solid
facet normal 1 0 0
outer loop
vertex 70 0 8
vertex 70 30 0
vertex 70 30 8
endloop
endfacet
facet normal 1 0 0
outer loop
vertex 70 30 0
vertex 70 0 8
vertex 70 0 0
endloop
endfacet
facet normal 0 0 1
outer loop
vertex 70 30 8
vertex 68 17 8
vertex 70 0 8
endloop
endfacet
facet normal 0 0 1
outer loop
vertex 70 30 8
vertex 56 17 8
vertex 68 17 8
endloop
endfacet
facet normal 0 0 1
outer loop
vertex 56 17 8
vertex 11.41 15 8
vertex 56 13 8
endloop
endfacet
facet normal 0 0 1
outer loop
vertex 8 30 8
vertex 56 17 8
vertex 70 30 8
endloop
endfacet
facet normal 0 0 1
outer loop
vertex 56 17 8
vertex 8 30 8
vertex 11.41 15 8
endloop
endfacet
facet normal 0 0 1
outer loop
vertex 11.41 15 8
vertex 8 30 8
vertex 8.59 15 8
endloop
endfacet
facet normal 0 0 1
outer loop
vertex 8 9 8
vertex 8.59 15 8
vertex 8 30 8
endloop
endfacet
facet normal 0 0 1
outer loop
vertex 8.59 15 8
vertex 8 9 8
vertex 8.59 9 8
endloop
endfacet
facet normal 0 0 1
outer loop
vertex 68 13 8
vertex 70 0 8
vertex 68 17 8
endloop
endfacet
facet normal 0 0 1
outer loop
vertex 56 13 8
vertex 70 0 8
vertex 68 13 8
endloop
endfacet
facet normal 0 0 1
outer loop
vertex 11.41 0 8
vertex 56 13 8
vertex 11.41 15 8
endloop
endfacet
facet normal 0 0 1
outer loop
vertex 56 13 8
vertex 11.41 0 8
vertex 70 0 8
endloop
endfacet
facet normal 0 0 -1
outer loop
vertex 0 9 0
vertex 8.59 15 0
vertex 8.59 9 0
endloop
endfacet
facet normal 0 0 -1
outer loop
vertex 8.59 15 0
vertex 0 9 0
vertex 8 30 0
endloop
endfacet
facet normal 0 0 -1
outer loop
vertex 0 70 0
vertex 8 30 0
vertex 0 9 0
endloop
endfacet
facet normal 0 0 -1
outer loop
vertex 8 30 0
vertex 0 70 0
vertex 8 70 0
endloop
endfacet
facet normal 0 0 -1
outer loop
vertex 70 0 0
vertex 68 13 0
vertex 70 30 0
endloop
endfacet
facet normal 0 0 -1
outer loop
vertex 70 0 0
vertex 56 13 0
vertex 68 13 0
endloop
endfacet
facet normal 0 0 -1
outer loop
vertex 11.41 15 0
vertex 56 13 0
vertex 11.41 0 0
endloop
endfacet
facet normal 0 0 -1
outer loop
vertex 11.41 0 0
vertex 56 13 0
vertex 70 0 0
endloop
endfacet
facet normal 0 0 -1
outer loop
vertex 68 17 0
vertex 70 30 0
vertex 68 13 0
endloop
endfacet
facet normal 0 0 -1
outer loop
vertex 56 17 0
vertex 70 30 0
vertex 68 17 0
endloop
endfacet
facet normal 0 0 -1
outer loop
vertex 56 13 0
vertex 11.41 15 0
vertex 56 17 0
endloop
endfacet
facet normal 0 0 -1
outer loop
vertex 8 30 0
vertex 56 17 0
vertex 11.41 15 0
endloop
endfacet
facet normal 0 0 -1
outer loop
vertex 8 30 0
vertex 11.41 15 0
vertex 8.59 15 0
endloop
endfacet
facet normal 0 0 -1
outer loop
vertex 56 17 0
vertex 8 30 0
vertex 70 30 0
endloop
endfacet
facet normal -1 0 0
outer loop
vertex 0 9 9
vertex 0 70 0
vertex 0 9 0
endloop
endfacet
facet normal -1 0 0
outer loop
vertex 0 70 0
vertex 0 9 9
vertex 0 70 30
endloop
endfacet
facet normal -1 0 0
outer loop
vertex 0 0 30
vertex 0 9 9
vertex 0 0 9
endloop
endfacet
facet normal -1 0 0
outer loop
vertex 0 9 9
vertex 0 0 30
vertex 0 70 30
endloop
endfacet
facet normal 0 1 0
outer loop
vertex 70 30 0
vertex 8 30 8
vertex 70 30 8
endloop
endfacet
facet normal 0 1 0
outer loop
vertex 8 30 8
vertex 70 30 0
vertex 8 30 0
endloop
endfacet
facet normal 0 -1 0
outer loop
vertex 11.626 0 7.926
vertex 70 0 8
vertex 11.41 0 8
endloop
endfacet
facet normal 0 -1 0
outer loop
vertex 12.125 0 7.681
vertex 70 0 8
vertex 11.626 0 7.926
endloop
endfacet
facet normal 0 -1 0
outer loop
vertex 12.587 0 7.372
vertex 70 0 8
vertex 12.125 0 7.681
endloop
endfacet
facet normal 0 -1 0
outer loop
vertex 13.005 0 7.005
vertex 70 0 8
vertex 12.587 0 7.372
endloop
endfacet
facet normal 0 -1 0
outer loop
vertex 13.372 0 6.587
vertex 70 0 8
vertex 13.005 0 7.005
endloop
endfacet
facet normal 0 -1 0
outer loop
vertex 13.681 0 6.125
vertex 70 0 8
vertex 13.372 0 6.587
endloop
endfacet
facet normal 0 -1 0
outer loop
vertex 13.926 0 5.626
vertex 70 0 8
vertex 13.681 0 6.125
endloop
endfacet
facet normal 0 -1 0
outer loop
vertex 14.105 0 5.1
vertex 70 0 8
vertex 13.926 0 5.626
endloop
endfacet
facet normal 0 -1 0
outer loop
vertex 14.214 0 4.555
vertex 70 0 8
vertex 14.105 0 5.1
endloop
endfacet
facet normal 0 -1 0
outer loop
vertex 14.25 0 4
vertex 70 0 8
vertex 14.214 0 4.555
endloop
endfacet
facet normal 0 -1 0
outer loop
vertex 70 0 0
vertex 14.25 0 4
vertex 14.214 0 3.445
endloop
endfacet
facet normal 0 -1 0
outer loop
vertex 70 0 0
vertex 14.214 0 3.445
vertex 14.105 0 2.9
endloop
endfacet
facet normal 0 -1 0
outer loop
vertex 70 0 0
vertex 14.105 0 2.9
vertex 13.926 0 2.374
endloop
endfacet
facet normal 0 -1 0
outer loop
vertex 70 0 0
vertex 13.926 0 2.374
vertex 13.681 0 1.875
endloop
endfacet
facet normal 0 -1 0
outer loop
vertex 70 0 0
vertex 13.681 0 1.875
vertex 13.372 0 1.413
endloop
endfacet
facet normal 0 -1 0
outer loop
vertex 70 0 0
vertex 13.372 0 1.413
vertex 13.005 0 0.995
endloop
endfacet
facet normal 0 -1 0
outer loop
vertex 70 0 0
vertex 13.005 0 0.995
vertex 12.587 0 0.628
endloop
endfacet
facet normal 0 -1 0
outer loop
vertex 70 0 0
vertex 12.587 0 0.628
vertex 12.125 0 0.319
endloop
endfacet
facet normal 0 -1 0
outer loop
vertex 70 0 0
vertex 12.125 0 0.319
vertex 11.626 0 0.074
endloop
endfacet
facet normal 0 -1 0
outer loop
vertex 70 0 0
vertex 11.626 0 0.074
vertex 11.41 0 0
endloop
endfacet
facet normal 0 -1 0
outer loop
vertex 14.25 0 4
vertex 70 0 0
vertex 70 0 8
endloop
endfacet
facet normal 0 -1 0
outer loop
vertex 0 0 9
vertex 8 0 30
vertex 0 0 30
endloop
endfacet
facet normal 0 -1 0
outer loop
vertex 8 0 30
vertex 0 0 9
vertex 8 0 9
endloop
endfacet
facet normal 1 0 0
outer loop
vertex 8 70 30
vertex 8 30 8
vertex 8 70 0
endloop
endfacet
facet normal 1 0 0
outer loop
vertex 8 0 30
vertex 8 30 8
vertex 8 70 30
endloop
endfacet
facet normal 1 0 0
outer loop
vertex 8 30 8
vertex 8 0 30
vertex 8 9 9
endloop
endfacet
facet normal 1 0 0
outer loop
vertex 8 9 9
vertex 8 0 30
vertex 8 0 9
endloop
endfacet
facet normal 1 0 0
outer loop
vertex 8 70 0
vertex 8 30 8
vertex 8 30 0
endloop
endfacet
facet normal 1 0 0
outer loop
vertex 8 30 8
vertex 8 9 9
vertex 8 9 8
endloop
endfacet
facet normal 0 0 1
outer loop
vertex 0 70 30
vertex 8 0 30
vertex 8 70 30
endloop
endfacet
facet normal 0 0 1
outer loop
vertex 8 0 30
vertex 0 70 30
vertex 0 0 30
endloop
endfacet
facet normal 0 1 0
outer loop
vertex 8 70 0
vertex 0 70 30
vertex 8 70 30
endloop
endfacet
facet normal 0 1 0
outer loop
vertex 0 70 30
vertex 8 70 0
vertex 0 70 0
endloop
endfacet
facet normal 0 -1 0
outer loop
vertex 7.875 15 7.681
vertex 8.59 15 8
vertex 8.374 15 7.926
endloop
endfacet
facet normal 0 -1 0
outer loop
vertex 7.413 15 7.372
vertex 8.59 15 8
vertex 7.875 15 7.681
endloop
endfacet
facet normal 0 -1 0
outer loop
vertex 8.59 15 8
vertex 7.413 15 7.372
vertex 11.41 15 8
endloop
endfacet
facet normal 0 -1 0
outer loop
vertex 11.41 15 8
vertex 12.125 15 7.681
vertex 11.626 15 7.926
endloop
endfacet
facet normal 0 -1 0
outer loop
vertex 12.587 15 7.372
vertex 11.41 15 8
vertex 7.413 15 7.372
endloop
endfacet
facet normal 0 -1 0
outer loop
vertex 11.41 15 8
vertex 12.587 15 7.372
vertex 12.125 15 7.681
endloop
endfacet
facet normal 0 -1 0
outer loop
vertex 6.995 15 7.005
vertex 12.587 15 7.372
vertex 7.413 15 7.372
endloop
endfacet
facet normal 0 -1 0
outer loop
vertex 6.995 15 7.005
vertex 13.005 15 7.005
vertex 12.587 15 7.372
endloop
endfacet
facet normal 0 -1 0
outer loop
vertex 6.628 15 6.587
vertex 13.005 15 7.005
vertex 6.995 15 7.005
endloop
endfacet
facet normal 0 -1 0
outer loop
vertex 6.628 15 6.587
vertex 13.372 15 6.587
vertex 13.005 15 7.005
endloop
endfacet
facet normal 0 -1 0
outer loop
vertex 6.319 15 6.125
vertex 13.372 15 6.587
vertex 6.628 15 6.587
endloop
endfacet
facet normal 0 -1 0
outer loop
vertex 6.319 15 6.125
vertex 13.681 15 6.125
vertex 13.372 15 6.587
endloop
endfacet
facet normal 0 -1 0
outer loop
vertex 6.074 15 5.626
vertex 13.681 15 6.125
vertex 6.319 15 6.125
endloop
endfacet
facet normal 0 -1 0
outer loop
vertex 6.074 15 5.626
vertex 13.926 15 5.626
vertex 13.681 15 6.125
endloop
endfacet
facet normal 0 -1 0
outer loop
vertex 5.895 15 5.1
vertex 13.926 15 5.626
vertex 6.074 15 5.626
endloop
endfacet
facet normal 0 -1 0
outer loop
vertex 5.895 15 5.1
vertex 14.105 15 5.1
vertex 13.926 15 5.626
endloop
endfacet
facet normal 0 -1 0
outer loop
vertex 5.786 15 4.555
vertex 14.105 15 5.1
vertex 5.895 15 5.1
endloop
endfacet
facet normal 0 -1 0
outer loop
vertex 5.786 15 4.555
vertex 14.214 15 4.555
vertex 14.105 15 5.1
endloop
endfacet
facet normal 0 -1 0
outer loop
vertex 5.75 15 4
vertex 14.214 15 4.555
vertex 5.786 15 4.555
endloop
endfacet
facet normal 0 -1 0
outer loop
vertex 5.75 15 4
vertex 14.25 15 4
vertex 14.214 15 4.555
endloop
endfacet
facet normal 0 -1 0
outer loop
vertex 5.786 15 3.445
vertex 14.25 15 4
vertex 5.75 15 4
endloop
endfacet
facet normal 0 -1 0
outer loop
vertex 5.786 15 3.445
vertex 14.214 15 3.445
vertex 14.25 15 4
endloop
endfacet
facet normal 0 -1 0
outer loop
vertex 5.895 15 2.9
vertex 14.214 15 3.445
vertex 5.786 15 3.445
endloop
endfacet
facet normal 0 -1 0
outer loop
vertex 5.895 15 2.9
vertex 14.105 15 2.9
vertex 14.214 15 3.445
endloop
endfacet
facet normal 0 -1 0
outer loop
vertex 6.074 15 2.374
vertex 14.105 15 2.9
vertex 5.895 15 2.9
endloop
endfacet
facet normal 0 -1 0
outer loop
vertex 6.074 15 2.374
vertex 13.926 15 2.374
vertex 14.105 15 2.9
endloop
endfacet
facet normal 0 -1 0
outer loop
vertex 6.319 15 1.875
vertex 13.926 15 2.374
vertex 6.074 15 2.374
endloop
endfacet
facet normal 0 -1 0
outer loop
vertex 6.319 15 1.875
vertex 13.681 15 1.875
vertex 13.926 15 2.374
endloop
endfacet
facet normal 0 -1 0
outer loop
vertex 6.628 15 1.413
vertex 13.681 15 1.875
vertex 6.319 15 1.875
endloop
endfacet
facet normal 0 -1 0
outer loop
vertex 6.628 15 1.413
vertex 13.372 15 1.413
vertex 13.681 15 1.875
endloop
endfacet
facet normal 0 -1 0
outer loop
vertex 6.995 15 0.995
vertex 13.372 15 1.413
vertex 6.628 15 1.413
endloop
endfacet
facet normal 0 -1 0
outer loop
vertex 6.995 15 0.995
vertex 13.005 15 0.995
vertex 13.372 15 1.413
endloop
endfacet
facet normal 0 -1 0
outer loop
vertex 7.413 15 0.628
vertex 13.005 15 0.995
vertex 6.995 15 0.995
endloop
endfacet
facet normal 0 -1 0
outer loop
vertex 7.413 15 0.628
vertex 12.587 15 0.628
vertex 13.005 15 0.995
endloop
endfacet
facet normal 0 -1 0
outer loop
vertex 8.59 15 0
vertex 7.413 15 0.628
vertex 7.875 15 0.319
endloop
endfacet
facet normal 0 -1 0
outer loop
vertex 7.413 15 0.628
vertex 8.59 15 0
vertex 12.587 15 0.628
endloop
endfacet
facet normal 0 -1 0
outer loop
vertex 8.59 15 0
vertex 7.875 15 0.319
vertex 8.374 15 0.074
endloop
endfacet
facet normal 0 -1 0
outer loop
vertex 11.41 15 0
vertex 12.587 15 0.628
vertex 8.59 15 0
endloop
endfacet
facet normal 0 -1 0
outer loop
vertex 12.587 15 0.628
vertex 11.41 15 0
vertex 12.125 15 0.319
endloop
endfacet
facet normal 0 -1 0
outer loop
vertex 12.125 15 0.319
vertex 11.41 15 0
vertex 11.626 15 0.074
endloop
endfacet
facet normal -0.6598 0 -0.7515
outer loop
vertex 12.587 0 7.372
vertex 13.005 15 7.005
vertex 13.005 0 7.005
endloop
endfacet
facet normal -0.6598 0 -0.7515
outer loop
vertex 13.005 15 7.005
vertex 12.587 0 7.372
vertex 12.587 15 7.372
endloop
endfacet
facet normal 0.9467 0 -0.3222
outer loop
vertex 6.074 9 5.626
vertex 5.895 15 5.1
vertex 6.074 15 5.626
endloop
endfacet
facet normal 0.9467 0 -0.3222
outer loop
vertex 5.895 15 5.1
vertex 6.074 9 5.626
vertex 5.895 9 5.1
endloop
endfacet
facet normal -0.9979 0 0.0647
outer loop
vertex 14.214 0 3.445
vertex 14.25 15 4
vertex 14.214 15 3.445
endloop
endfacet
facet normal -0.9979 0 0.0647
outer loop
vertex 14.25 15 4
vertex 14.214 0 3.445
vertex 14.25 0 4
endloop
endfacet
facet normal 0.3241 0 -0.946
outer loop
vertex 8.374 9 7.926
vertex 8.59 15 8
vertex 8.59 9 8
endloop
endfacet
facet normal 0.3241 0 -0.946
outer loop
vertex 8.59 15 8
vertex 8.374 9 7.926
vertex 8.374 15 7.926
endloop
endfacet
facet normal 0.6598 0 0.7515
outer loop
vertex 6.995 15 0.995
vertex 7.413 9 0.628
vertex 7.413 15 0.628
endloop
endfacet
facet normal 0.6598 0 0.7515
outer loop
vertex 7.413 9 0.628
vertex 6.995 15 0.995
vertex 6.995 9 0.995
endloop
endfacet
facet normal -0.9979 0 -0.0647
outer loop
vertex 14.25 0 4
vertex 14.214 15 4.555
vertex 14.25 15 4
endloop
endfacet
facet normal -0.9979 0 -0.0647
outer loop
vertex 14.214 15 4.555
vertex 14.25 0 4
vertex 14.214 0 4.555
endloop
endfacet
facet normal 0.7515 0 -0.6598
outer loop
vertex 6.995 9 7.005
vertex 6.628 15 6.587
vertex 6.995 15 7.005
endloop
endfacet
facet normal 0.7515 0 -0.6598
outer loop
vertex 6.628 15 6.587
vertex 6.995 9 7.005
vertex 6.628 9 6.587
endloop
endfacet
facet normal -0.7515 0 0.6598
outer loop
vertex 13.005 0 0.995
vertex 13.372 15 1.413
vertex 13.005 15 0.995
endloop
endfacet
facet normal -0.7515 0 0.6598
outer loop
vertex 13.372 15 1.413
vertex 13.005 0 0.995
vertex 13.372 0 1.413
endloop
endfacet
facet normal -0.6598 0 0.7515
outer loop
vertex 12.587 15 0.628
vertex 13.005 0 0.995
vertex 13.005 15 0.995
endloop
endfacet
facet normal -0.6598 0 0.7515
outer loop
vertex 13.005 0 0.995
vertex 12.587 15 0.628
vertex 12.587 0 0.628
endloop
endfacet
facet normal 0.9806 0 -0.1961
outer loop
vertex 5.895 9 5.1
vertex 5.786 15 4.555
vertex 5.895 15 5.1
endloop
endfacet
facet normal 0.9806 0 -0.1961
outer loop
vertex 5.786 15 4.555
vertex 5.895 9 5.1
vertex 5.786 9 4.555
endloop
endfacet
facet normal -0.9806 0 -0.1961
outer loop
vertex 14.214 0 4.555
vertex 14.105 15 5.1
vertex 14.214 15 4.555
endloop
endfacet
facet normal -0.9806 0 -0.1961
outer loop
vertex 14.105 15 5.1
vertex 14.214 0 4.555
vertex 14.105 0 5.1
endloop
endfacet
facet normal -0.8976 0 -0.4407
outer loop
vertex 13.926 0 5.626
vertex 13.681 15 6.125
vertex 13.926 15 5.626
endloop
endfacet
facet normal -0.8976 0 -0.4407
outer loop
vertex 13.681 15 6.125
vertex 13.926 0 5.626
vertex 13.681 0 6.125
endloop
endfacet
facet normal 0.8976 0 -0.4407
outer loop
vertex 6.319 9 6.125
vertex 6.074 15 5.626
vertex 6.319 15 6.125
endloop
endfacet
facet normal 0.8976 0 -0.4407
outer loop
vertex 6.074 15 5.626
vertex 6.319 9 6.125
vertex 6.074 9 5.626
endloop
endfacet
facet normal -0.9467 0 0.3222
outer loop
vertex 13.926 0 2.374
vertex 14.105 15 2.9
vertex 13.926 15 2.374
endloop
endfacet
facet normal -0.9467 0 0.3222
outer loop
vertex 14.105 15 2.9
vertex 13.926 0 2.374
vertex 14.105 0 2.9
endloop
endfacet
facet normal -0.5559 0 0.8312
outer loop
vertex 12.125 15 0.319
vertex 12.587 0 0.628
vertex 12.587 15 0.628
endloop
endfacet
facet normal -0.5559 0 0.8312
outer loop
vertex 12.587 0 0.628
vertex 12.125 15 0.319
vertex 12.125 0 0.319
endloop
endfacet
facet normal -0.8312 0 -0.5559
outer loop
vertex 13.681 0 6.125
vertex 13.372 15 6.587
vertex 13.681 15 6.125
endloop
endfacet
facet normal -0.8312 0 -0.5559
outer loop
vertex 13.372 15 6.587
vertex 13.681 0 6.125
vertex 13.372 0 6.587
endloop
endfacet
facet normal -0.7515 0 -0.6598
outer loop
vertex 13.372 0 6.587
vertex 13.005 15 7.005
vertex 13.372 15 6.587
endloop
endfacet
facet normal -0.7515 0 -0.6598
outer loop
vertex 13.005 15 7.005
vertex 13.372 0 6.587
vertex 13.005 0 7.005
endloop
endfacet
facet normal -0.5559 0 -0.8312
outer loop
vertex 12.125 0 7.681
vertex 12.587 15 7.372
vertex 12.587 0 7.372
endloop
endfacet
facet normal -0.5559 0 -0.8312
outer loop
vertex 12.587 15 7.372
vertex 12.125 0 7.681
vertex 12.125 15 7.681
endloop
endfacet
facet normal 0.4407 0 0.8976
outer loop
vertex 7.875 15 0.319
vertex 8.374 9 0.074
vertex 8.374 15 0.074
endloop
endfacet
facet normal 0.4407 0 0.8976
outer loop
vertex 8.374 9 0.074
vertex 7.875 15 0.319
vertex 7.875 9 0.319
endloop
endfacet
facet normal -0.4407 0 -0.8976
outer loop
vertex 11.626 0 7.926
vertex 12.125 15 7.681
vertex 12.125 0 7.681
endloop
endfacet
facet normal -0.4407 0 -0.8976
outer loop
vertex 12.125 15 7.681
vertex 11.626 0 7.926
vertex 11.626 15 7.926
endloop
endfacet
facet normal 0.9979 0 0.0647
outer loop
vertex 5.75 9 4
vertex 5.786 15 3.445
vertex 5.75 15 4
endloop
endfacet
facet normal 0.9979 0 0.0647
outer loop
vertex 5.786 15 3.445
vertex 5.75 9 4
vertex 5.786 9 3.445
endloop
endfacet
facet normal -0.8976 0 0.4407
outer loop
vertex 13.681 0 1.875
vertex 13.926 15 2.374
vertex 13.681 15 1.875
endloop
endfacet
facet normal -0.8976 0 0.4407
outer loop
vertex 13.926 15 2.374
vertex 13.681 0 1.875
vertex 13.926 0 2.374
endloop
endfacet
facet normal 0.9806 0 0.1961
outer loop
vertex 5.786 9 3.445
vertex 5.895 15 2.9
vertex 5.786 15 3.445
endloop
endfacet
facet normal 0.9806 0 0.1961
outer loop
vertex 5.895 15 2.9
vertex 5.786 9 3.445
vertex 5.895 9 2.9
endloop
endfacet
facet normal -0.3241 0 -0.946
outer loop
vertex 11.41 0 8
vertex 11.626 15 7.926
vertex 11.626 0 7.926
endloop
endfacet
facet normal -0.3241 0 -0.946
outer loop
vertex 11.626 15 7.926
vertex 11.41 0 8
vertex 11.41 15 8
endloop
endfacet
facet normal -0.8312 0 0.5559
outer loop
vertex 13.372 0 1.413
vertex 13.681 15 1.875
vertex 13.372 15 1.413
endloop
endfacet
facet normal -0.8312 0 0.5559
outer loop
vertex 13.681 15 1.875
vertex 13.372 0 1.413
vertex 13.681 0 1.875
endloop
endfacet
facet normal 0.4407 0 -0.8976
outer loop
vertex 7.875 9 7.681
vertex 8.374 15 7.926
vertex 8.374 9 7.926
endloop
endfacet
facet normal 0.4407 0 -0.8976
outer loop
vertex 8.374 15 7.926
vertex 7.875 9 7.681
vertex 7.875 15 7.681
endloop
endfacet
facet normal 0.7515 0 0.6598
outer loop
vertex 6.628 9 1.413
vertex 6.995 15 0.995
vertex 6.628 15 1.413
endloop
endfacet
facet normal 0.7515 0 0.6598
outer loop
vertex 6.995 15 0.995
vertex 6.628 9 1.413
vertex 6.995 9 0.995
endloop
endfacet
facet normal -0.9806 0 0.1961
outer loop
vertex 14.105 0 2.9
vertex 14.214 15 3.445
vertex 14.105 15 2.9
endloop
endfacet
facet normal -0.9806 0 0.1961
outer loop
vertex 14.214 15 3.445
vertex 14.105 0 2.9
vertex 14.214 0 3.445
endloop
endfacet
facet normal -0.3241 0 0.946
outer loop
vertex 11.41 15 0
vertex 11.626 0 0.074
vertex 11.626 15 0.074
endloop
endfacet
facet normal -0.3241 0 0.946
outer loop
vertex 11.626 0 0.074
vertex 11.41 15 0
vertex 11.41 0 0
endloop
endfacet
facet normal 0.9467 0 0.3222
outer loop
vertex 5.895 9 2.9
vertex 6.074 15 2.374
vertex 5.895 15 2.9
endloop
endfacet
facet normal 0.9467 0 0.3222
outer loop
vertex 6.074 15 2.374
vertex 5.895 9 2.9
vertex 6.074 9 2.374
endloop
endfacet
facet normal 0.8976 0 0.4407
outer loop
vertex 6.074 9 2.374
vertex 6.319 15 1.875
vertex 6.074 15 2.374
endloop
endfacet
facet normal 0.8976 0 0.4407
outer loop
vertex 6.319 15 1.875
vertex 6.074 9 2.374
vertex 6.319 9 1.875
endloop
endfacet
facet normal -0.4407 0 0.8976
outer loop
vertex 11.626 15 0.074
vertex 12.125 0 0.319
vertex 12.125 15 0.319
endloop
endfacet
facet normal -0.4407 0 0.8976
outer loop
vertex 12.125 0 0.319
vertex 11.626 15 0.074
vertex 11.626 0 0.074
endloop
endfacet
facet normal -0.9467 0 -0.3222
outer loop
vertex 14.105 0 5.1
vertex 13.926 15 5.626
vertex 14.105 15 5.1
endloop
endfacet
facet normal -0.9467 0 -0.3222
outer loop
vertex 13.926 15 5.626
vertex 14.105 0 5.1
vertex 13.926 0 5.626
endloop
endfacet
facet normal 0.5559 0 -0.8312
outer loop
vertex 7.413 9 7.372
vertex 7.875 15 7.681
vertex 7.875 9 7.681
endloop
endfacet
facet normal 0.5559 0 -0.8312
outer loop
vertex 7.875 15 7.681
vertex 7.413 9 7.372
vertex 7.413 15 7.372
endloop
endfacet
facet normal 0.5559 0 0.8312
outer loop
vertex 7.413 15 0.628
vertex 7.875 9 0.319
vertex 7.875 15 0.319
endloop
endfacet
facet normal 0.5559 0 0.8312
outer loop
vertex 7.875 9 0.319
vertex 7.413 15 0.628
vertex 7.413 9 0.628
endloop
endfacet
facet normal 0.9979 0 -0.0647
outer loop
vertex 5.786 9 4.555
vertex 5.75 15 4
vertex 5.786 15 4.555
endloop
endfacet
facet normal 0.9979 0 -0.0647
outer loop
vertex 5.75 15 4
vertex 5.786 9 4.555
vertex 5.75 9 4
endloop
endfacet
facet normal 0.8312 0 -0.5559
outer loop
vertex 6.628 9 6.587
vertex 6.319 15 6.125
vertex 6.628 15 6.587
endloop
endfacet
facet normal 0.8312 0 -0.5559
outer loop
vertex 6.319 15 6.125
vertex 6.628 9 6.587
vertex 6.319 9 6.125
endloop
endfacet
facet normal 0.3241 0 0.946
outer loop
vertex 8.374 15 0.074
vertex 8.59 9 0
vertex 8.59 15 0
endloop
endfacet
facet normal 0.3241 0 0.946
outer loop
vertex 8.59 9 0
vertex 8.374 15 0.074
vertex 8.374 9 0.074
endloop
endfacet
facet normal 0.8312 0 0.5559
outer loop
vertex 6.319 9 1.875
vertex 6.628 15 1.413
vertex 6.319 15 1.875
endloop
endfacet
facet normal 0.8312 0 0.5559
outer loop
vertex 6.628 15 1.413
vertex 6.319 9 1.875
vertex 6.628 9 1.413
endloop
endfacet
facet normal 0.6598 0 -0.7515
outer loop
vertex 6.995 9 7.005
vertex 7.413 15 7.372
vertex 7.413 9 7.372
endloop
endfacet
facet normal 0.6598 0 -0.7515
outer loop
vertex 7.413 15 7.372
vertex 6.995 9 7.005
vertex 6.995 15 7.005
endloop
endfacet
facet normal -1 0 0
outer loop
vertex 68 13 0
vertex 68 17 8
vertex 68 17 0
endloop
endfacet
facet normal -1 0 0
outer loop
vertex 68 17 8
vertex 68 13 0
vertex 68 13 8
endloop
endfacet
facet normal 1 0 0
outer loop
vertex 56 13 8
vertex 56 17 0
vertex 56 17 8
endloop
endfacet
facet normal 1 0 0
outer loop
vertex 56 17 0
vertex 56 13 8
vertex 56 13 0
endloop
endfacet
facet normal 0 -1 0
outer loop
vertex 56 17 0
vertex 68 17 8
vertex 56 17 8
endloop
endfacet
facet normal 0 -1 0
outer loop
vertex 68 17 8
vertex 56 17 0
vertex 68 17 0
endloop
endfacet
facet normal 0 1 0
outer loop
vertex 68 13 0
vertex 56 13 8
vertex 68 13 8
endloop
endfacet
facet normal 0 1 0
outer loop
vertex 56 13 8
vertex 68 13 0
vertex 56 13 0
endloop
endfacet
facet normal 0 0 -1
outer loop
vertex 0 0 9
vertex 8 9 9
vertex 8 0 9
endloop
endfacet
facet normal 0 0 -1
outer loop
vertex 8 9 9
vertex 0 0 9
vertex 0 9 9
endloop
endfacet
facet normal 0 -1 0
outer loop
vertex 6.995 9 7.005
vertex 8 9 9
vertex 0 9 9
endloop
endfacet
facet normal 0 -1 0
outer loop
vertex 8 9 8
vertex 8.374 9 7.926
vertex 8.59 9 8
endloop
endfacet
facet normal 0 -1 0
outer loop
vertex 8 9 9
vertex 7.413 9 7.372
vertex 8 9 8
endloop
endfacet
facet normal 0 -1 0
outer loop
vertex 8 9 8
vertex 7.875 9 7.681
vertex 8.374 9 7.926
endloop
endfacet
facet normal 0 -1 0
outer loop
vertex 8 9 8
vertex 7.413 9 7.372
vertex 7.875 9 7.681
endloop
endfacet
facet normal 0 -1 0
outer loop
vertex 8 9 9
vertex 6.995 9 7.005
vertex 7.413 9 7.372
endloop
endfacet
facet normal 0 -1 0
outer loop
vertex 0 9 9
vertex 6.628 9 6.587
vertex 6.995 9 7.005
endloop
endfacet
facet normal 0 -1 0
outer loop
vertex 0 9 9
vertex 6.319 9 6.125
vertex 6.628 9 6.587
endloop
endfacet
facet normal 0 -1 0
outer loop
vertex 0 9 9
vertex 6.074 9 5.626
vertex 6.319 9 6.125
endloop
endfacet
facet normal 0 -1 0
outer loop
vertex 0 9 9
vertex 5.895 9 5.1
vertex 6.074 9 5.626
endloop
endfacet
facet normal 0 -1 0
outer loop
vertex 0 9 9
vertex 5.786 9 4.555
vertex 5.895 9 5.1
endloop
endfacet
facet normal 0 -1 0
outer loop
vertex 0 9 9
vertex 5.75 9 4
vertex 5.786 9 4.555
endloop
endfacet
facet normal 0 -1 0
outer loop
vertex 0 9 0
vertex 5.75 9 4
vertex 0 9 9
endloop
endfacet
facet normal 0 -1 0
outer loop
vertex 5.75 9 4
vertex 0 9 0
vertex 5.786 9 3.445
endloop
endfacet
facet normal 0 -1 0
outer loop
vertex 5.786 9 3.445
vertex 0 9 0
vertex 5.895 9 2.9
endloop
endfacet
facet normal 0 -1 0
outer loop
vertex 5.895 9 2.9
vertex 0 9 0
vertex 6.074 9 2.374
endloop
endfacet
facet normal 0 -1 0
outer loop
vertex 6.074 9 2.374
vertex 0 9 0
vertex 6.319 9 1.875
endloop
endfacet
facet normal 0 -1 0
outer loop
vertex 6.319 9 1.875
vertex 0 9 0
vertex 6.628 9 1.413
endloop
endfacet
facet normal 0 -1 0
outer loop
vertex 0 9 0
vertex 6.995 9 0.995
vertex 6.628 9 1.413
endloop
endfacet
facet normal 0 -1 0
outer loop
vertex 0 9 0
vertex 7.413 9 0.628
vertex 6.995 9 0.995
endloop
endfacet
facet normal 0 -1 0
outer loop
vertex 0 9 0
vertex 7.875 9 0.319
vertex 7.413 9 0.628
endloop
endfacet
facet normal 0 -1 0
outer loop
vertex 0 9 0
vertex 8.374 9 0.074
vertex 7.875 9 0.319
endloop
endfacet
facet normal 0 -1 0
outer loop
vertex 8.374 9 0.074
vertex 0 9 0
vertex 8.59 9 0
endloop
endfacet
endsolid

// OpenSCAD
module garden_bench_bracket(
hole_spacing=110,
plate_width=30,
thickness=8,
hole_diameter=8.5,
leg_a=70,
leg_b=70,
bend_radius=6,
edge_margin=10,
drain_slot_w=4,
drain_slot_l=12,
drain_slot_offset=8
) {
// Rough L-bracket representation, intended for refinement.
// Coordinate system:
// leg_a extends in +X, leg_b extends in +Y, thickness in Z.
// Hole spacing preserved along the long arm.

difference() {
union() {
// Horizontal leg
translate([0, 0, 0])
cube([leg_a, plate_width, thickness]);

// Vertical leg
translate([0, 0, 0])
cube([thickness, leg_b, plate_width]);
}

// Main through holes on long arm, centered on width
for (xpos = [edge_margin, edge_margin + hole_spacing]) {
translate([xpos, plate_width/2, thickness/2])
rotate([90, 0, 0])
cylinder(h=plate_width + 2, d=hole_diameter, $fn=48);
}

// Drain path slot on low region of horizontal leg
translate([leg_a - drain_slot_offset, plate_width/2, thickness/2])
cube([drain_slot_l, drain_slot_w, thickness + 2], center=true);

// Simple corner relief for bend/drain clearance
translate([thickness/2, thickness/2, thickness/2])
cube([thickness + 2, thickness + 2, thickness + 2], center=true);
}
}

garden_bench_bracket();
